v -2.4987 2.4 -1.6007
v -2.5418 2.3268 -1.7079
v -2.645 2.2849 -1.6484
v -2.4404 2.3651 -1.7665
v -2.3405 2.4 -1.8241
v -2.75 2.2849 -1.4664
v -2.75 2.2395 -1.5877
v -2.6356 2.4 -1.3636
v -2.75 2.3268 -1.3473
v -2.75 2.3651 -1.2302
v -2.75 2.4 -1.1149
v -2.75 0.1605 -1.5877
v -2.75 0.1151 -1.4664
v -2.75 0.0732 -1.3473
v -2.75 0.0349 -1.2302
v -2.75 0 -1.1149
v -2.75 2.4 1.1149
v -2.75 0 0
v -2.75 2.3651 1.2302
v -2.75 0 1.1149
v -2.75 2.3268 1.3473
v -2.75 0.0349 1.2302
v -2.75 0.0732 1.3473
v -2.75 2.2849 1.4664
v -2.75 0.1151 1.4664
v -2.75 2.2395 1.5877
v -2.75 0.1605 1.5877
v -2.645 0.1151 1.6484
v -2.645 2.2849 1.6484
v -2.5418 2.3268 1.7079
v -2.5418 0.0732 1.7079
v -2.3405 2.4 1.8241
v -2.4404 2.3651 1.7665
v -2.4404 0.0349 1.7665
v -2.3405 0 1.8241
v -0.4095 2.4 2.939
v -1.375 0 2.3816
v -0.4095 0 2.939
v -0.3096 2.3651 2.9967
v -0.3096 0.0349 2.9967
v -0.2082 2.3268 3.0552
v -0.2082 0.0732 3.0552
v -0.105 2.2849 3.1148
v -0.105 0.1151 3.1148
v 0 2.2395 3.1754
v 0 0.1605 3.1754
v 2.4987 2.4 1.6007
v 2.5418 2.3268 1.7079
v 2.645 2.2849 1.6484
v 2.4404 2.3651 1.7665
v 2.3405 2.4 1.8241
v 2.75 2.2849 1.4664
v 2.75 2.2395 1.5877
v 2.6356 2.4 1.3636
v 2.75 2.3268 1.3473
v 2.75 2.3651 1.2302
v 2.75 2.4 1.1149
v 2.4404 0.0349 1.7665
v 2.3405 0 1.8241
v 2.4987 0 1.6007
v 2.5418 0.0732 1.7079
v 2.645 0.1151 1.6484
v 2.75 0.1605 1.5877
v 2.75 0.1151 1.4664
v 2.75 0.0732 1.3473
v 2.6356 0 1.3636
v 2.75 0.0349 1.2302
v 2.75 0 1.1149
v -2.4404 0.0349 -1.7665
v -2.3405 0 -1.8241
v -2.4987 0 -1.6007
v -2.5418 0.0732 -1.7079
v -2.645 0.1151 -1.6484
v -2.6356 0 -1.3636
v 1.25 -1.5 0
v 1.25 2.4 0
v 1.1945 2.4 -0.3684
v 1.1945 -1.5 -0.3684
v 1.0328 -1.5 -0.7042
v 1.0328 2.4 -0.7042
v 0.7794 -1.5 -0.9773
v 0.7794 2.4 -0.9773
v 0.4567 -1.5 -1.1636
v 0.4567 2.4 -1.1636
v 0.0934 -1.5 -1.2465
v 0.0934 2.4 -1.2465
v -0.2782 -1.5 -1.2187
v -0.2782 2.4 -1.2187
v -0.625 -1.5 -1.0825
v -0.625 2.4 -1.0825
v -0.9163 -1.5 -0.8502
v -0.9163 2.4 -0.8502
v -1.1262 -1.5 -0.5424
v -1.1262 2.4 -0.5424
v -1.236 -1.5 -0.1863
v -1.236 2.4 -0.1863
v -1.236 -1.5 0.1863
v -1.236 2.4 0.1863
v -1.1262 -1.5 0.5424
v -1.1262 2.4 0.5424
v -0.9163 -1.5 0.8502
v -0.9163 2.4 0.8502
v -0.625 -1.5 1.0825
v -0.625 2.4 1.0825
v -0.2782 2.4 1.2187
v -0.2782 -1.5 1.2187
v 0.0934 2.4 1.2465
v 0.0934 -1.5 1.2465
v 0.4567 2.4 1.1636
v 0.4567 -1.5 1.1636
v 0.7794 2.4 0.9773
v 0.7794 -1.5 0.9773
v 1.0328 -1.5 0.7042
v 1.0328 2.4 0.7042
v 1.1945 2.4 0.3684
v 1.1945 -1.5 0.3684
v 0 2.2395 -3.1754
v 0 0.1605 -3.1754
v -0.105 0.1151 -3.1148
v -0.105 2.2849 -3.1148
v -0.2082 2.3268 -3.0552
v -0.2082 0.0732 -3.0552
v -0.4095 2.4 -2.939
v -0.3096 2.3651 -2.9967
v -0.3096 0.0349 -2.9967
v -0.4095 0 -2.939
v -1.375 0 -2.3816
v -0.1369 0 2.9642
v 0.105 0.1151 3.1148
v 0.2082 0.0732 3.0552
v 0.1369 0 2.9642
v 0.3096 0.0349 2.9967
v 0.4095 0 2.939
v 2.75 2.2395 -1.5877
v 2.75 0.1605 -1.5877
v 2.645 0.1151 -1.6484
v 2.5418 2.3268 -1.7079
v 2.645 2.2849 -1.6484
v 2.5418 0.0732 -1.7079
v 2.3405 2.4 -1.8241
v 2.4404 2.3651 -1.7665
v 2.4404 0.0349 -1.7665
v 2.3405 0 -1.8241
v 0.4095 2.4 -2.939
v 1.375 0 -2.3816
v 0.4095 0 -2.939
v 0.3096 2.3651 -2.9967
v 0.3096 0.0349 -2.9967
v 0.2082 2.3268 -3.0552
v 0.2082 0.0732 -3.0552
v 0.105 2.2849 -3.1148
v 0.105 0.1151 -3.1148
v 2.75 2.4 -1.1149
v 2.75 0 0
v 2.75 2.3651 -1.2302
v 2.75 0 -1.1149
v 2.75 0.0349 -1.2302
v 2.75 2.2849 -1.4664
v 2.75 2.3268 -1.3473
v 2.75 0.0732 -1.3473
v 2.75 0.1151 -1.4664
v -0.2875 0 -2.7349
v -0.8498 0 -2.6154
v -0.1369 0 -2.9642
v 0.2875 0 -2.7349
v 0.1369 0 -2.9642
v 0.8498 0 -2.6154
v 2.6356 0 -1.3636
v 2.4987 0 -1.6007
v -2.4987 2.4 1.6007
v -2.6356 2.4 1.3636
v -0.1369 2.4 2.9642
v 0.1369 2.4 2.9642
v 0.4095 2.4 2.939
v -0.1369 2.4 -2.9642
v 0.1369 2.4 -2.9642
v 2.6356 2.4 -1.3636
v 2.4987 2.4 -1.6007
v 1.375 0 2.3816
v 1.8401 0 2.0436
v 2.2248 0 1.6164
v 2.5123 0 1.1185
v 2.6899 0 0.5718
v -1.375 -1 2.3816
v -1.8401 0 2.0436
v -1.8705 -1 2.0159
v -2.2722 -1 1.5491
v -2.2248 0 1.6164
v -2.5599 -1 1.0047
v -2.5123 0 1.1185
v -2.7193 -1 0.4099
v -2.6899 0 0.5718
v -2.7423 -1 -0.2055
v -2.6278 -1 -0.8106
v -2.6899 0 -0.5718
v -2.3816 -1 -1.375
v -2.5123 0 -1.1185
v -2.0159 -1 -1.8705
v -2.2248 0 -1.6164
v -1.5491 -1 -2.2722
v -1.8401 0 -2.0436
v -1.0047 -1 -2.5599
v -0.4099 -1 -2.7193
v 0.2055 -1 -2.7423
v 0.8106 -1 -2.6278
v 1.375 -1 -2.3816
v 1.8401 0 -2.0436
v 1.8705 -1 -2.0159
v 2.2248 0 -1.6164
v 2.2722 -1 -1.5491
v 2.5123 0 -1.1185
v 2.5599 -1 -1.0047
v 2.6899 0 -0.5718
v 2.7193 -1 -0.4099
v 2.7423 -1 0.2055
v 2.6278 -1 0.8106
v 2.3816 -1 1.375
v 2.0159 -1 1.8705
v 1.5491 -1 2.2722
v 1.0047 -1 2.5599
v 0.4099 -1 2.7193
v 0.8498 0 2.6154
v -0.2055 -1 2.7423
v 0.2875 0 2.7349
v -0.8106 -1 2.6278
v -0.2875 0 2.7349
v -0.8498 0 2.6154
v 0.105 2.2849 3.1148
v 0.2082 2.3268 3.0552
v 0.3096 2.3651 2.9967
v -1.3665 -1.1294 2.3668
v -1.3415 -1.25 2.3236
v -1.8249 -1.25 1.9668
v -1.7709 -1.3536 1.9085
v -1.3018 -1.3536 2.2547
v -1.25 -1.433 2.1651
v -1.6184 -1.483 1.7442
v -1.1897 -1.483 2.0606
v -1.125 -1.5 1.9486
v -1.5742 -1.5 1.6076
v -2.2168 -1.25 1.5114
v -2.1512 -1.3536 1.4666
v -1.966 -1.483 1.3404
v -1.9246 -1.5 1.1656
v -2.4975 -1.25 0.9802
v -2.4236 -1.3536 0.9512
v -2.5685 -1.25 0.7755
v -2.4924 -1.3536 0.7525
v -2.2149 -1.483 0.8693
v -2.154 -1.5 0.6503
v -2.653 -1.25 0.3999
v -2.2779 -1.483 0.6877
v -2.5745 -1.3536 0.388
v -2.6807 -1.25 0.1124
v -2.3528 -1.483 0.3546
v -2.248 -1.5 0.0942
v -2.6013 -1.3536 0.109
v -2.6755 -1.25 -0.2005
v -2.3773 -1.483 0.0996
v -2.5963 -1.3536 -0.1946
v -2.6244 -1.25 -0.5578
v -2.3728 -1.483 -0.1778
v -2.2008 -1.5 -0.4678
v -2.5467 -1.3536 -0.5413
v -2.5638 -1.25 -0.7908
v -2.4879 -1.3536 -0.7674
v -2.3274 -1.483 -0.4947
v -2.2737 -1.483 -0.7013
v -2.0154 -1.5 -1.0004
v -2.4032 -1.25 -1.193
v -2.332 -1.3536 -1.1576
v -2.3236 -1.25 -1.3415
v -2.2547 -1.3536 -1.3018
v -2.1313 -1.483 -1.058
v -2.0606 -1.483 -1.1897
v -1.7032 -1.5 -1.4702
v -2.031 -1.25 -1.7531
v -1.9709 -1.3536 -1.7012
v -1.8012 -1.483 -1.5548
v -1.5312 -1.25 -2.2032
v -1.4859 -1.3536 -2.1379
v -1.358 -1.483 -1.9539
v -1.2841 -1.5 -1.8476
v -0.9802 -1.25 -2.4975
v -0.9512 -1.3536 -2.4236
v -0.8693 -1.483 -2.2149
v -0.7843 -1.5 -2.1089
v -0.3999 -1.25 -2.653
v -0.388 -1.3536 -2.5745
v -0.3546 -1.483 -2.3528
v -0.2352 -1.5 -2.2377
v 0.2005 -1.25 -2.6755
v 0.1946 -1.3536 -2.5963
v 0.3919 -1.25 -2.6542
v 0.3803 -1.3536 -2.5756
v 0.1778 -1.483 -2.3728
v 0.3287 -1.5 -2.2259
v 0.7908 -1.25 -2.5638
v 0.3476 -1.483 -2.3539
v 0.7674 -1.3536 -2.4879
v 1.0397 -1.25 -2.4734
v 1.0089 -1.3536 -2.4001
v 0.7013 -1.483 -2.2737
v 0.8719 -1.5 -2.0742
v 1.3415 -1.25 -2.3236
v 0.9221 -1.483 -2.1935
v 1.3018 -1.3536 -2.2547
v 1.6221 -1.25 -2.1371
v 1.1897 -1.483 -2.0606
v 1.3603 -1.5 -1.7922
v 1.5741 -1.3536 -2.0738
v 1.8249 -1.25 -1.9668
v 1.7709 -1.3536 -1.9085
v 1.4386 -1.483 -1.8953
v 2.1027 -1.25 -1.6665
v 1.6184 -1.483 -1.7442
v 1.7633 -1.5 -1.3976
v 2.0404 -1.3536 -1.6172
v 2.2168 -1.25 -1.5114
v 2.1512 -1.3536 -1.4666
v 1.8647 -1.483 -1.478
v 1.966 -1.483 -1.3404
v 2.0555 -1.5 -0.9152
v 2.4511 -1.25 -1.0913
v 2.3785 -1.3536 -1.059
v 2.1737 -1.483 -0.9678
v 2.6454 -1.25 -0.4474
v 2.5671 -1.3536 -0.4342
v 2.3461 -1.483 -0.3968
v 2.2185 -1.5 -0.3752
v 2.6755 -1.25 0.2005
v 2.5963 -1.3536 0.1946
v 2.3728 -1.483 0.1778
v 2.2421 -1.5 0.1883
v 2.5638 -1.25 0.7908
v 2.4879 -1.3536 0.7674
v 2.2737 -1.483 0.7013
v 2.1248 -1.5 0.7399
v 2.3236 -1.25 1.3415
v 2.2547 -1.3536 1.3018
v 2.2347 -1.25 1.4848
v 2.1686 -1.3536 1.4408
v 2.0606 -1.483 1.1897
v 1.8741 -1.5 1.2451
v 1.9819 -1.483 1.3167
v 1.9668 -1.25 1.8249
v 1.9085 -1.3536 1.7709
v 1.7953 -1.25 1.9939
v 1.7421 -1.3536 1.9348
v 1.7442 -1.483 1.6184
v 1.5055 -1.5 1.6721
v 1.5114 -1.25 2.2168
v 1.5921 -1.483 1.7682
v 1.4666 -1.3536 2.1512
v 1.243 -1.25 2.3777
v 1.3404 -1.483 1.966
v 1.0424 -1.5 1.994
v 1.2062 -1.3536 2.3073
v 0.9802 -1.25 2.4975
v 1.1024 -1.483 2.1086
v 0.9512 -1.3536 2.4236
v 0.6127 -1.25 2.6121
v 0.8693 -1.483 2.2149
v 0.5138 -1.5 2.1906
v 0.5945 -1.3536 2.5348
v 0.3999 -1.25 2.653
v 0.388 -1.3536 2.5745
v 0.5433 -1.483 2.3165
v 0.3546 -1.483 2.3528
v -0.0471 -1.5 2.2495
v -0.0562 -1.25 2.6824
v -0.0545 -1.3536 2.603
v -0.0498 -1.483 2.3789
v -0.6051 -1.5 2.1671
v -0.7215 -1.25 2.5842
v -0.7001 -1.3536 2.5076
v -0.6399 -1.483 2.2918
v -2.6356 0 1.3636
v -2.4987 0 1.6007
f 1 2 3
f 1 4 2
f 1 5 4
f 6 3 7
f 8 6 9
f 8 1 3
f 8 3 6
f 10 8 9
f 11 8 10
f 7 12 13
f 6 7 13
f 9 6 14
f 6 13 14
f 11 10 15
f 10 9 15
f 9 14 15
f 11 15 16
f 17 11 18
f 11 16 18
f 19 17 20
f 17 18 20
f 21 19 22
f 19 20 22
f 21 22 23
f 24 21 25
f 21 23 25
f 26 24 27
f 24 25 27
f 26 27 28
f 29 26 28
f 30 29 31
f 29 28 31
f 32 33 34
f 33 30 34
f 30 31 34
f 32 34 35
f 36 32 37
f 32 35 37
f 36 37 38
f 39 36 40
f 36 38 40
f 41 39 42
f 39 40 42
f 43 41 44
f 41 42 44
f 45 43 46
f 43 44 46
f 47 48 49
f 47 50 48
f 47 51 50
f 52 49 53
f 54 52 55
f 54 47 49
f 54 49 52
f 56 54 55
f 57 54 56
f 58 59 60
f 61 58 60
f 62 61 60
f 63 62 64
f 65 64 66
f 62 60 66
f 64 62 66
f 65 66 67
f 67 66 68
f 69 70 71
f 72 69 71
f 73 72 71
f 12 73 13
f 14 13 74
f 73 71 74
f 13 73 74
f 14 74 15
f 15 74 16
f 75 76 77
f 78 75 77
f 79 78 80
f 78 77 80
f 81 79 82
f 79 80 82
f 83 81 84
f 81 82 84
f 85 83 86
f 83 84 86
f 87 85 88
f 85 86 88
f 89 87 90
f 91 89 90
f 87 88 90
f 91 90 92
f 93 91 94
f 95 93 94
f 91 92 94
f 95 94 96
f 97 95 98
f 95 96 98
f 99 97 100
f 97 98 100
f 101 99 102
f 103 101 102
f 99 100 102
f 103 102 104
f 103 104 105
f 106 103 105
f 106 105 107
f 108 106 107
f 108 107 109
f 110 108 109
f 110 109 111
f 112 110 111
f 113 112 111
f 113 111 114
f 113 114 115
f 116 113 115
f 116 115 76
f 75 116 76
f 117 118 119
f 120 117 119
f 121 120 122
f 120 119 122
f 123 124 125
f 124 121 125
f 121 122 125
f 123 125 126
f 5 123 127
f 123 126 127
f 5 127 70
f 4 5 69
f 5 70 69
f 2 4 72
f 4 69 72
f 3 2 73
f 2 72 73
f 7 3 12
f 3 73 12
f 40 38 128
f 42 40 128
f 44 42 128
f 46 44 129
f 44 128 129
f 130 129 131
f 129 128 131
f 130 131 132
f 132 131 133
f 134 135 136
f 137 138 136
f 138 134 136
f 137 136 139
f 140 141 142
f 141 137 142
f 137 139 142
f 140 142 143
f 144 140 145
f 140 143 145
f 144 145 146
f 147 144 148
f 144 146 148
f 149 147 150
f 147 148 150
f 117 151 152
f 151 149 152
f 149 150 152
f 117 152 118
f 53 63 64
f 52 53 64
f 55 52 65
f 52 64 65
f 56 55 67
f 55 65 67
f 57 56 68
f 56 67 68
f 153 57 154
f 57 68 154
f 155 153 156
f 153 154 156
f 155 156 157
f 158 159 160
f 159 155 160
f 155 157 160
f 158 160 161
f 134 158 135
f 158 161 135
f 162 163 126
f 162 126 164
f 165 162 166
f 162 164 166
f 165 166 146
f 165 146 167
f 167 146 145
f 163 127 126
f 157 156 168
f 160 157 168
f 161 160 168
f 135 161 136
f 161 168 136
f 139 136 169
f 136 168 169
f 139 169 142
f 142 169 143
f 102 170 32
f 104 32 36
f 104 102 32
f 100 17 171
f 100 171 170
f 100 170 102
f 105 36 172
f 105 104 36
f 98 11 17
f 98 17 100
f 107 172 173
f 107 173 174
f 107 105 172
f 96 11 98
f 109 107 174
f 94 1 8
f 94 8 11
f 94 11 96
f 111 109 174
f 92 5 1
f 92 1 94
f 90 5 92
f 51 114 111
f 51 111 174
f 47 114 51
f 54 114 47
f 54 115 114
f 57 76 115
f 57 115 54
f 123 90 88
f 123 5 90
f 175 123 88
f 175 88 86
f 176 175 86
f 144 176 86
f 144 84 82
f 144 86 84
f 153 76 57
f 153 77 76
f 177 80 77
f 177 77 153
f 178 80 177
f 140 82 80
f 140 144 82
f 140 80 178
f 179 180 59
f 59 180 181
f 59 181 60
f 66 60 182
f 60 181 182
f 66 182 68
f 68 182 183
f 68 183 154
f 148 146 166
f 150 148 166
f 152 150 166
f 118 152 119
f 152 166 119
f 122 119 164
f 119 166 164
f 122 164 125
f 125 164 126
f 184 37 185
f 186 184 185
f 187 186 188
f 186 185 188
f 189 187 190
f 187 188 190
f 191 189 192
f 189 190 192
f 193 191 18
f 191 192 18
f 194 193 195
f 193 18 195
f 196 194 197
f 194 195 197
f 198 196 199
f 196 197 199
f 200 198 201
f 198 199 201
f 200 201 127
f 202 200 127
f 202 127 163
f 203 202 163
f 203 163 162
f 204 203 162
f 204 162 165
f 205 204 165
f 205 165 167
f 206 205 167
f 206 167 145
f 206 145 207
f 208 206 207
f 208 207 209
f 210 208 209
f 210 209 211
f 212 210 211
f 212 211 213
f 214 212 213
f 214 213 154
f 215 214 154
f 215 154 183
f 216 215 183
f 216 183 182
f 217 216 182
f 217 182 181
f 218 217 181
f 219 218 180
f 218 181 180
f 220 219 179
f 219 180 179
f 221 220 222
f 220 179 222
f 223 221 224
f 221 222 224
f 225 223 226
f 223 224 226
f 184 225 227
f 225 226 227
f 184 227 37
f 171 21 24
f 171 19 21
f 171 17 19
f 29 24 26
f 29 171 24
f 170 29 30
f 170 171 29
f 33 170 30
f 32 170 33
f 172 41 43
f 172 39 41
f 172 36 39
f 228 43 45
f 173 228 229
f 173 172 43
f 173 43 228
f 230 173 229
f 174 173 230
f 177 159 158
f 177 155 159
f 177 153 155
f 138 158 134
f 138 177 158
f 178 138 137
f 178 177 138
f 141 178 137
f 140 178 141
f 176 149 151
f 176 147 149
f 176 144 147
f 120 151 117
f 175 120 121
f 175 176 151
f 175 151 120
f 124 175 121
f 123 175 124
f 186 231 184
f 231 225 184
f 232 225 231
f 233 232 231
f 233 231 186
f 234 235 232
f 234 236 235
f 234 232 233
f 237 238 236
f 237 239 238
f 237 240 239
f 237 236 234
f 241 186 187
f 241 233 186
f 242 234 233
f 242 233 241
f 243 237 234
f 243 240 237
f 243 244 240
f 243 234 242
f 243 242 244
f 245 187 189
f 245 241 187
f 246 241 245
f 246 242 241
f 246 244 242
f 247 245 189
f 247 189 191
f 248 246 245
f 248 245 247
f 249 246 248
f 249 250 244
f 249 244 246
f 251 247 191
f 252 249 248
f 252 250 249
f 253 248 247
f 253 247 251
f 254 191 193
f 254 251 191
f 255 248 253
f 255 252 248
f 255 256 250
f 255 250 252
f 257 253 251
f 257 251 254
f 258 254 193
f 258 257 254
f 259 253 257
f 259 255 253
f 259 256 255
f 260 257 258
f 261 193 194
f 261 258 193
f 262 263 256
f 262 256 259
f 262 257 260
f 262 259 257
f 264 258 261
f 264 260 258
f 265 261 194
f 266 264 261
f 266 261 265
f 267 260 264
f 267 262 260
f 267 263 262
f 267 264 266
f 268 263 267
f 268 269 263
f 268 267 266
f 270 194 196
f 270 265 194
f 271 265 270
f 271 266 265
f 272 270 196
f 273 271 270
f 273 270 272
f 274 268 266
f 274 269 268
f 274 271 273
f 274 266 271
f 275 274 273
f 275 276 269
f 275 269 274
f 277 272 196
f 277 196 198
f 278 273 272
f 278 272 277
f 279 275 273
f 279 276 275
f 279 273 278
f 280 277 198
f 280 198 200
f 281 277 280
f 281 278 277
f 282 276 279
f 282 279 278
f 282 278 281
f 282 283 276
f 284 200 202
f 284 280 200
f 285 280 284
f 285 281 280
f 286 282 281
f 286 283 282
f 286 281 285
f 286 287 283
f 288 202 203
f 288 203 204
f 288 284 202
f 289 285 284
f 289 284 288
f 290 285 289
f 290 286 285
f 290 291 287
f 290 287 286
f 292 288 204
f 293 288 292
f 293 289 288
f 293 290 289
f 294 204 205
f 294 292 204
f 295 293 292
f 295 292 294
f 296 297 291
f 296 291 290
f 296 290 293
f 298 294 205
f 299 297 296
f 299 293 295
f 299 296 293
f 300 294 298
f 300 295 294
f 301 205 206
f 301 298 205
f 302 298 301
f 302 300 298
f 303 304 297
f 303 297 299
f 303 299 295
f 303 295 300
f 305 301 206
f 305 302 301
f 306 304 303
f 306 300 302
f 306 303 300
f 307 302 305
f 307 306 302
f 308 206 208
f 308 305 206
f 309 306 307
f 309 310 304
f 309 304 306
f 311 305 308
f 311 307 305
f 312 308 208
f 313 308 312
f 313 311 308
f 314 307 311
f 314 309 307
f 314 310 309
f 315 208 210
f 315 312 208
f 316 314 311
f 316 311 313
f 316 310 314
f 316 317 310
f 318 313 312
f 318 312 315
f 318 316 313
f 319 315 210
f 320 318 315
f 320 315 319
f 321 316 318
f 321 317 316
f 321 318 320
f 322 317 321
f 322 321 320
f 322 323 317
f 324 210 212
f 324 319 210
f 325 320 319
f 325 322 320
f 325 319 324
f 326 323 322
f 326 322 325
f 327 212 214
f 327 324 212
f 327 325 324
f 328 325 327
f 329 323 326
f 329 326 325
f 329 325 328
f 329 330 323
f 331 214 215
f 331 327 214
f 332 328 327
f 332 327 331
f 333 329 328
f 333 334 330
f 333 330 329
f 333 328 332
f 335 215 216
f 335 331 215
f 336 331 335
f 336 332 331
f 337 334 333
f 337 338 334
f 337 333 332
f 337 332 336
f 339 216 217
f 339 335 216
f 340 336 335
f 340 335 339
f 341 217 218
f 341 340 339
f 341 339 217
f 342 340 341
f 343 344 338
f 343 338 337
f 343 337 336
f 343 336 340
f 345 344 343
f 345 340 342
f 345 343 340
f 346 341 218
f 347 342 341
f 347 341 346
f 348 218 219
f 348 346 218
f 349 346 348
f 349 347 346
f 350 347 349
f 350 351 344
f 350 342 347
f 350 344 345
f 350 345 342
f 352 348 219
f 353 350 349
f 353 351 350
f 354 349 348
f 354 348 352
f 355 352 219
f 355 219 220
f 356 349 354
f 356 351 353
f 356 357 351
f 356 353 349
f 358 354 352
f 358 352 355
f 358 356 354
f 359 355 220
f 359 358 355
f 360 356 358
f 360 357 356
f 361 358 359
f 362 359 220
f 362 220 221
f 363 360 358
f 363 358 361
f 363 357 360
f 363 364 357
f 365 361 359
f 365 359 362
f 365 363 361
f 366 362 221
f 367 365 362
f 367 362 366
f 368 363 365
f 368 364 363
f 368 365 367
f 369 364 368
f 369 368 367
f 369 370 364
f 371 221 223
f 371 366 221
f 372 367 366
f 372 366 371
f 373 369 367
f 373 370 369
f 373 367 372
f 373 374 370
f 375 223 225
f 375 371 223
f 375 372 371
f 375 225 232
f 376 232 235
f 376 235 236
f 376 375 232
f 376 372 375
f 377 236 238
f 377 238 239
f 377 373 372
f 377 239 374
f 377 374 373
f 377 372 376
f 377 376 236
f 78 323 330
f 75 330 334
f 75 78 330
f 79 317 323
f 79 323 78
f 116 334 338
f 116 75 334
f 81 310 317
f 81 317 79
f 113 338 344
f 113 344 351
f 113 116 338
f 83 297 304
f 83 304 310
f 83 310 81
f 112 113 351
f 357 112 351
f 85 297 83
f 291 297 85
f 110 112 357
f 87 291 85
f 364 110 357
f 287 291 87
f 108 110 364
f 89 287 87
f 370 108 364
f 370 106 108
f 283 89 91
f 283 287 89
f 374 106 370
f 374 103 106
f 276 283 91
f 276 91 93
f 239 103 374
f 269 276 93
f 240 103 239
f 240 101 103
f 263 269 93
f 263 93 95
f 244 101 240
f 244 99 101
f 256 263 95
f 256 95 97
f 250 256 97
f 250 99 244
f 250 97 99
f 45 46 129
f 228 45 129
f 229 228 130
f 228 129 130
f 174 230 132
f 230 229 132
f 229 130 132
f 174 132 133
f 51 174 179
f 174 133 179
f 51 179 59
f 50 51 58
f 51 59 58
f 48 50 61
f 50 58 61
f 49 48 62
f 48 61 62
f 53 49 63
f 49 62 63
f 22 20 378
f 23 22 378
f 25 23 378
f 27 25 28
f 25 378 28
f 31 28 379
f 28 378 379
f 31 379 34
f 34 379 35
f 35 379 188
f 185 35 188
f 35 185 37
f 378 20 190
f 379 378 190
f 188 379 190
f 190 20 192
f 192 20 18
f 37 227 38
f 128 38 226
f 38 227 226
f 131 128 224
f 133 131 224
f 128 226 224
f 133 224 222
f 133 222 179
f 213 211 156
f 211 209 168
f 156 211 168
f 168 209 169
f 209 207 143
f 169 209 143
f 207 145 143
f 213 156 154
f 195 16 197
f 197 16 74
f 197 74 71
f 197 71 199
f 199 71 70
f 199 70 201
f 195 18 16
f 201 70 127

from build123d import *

# Parameters (mm, degrees)
EXTRUDE_1_DEPTH    = 2.4
SKETCH_2_R         = 2.75
EXTRUDE_2_DEPTH    = 1.5
FILLET_1_R         = 0.5
HOLE_WIZARD_M3_1_D = 2.5


with BuildPart() as part:
    # 草图1 → 凸台-拉伸1 (new body)
    with BuildSketch(Plane(origin=(0, 0, 0), x_dir=(1, 0, 0), z_dir=(0, 1, 0))):
        Polygon((0, 3.175426481), (-2.75, 1.58771324), (-2.75, -1.58771324), (0, -3.175426481), (2.75, -1.58771324), (2.75, 1.58771324), align=None)
    extrude(amount=EXTRUDE_1_DEPTH)

    # 草图2 → 凸台-拉伸2 (add)
    with BuildSketch(Plane.XZ):
        with Locations(Location((0, 0, 0), (0, 0, 120))):
            Circle(SKETCH_2_R)
    extrude(amount=EXTRUDE_2_DEPTH)

    # 圆角1
    fillet_1_edges = [part.edges().sort_by_distance(p)[0] for p in [
        (1.375, -1.5, -2.38156986),
    ]]
    fillet(fillet_1_edges, radius=FILLET_1_R)

    # M3 螺纹孔1 (through all)
    with Locations(Plane(origin=(0, -1.5, 0), x_dir=(-1, 0, 0), z_dir=(0, -1, 0))):
        with Locations((0, 0)):
            Hole(HOLE_WIZARD_M3_1_D / 2)

    # 草图7 → 切除-旋转2 (revolve, cut)
    with BuildSketch(Plane(origin=(0, 0, 0), x_dir=(0, 0, -1), z_dir=(1, 0, 0)), mode=Mode.PRIVATE) as cut_revolve_2_sk:
        Polygon((-3.271284624, 2.165513719), (-2.967407764, 2.4), (-3.334569784, 2.4), align=None)
        Polygon((-3.334569784, 0), (-3.271284624, 0.234486281), (-2.967407764, 0), align=None)
    revolve(cut_revolve_2_sk.sketch.rotate(Axis((0, 0, 0), (0, 1, 0)), 180), axis=Axis((0, 0, 0), (0, 1, 0)), mode=Mode.SUBTRACT)


solid = part.part
